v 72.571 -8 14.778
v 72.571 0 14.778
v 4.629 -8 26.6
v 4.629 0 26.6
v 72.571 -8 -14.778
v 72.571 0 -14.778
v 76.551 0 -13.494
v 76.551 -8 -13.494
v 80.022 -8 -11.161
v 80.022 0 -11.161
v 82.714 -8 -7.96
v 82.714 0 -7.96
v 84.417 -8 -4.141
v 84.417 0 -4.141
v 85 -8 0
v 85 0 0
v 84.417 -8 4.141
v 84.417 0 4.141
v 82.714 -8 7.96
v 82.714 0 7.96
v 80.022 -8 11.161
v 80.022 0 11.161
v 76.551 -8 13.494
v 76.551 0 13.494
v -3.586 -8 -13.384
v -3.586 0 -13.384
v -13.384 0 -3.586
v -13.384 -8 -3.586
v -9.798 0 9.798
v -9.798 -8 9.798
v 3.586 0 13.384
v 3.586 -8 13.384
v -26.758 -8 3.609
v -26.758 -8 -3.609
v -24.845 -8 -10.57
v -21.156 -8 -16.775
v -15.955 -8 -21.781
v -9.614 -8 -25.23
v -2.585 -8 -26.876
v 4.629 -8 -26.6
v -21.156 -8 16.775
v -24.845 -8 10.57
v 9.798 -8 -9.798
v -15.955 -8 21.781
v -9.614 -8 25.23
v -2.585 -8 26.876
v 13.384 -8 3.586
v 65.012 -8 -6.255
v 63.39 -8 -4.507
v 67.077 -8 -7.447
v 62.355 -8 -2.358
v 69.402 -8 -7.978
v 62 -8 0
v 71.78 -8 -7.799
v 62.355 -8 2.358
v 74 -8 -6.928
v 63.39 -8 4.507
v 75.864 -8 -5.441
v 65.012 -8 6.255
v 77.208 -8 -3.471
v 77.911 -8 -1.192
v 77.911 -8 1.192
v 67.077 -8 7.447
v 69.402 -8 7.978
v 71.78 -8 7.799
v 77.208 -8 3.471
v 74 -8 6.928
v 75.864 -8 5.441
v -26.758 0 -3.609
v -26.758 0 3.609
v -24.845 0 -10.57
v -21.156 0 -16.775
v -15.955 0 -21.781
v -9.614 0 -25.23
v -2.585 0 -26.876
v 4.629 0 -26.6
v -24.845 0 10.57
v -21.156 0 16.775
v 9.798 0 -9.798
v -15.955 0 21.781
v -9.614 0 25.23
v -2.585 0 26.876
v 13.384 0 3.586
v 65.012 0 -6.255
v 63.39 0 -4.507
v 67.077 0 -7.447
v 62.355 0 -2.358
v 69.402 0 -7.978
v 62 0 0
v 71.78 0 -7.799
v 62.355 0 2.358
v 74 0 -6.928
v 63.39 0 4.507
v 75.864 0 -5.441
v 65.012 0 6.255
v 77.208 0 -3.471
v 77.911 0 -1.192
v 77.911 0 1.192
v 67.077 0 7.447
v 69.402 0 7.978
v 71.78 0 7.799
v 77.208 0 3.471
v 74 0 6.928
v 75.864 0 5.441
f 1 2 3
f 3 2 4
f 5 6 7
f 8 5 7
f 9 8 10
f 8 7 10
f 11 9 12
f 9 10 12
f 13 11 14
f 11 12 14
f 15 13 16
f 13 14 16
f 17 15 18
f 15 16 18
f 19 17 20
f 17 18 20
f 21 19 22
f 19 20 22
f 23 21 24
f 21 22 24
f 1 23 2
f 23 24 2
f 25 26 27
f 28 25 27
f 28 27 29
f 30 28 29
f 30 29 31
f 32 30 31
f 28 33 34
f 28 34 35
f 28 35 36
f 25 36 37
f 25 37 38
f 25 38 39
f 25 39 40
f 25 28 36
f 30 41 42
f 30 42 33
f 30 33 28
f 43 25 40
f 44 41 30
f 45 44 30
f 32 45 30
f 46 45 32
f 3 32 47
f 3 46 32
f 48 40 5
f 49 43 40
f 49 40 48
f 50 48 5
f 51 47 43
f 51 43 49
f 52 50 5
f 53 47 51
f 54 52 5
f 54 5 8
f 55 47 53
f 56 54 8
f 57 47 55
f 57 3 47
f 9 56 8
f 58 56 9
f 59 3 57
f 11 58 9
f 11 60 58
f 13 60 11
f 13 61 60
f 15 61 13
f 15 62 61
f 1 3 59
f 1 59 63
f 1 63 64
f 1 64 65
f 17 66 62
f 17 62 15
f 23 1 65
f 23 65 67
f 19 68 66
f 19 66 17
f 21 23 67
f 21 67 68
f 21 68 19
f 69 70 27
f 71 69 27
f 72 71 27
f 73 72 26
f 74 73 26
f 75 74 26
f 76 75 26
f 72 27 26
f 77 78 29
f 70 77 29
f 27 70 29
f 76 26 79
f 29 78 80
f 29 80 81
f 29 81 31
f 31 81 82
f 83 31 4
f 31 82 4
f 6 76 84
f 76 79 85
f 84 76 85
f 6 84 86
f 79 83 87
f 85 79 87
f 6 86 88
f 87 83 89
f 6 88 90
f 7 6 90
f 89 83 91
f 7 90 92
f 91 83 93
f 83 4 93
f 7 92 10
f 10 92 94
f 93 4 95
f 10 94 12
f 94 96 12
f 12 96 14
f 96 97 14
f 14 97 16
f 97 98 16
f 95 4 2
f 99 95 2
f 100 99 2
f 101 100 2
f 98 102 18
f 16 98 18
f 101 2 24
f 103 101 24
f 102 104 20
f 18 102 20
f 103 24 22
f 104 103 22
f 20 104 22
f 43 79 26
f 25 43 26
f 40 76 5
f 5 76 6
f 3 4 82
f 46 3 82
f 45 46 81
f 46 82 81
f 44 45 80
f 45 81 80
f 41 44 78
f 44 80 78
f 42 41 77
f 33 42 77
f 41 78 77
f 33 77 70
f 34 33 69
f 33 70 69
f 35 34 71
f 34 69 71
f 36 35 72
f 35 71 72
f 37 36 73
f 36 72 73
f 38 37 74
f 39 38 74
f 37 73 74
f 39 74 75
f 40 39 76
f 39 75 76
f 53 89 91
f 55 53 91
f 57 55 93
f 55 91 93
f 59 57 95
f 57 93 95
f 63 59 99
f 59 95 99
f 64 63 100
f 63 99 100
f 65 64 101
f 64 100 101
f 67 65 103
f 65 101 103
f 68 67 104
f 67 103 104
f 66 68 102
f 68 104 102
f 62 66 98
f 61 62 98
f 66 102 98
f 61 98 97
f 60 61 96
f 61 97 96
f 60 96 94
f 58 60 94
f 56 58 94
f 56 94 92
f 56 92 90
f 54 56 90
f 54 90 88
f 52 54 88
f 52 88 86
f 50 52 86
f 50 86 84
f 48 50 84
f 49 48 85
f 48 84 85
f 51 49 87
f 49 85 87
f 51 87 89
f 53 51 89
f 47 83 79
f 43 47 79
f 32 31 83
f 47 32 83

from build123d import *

# Parameters (mm, degrees)
F1_DEPTH = 8


with BuildPart() as f1:
    # F0 (on Front) → F1 (new body)
    with BuildSketch(Plane.XZ):
        with BuildLine():
            Line((72.5714285714, 14.7779482711), (4.6285714286, 26.6003068879))
            ThreePointArc((4.6285714286, 26.6003068879), (-27, 0), (4.6285714286, -26.6003068879))
            Line((4.6285714286, -26.6003068879), (72.5714285714, -14.7779482711))
            ThreePointArc((72.5714285714, -14.7779482711), (85, 0), (72.5714285714, 14.7779482711))
        make_face()
        Polygon((3.5863018887, 13.3842608598), (13.3842608598, 3.5863018887), (12.4233141649, 0), (9.7979589711, -9.7979589711), (-3.5863018887, -13.3842608598), (-13.3842608598, -3.5863018887), (-9.7979589711, 9.7979589711), align=None, mode=Mode.SUBTRACT)
        with BuildLine():
            ThreePointArc((78, 0), (70, -8), (62, 0))
            ThreePointArc((62, 0), (70, 8), (78, 0))
        make_face(mode=Mode.SUBTRACT)
    extrude(amount=F1_DEPTH)


solid = f1.part
